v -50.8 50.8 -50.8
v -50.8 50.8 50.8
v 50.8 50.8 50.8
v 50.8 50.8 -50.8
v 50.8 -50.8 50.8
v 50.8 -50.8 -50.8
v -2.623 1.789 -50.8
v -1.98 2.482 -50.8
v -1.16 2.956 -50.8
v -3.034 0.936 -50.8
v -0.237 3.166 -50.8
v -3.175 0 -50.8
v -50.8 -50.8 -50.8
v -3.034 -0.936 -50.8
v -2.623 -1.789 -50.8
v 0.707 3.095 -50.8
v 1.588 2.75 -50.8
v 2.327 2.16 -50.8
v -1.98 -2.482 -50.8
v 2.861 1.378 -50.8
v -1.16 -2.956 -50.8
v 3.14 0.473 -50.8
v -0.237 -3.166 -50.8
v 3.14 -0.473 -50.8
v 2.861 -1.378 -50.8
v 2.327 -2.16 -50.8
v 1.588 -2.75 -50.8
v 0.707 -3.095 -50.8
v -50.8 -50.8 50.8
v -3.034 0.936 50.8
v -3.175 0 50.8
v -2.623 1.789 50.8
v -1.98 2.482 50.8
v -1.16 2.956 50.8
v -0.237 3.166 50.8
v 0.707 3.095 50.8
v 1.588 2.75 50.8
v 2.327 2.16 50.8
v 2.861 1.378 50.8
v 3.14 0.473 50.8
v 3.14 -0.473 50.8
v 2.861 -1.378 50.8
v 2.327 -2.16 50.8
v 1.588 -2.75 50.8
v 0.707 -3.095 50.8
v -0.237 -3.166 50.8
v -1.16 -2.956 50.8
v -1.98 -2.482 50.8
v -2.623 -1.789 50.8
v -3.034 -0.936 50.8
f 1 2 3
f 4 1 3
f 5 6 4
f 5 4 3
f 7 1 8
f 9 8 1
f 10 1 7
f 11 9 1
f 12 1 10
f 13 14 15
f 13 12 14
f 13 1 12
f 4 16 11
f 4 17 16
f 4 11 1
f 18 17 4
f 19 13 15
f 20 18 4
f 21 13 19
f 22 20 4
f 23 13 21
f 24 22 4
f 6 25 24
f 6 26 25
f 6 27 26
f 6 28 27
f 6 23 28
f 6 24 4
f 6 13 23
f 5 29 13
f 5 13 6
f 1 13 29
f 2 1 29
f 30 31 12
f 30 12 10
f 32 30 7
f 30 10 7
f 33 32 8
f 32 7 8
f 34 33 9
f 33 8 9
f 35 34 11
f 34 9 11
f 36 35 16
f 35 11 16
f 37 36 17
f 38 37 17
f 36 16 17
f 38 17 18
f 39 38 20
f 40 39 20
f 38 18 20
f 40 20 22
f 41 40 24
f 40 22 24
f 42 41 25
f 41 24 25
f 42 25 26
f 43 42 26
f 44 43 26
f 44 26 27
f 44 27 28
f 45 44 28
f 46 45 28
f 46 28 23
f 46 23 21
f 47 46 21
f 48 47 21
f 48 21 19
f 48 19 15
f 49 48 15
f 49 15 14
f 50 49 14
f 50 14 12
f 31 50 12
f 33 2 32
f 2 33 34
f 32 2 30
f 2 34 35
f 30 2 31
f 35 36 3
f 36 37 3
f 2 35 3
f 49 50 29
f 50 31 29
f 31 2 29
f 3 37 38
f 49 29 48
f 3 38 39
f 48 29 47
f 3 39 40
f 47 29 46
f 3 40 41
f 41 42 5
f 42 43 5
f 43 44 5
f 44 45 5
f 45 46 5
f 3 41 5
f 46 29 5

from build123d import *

# Parameters (mm, degrees)
F0_W     = 101.6
F0_H     = 101.6
F1_DEPTH = 50.8
F3_D     = 6.35


with BuildPart() as f1:
    # F0 (on Front) → F1 (new body, symmetric)
    with BuildSketch(Plane.XZ):
        Rectangle(F0_W, F0_H)
    extrude(amount=F1_DEPTH, both=True)

    # F3 (through all)
    with Locations(Plane.XY.offset(50.8)):
        with Locations((0, 0)):
            Hole(F3_D / 2)


solid = f1.part
